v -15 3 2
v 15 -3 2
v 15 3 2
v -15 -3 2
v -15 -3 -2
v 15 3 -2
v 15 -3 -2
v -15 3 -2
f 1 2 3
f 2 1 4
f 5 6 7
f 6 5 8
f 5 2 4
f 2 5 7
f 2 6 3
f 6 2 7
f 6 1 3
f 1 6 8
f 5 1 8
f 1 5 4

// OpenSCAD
// Fixture: the `lever` mode.
//
// `lever_length` stands in for locking-mechanism-hyperobject.lever_length: it is scoped
// to this mode by `visible_in_modes` and it is USED here, so it is alive — even though
// no source of the `stand` mode mentions it. A rule that judged a parameter against
// every mode instead of the modes that list it would call this healthy parameter dead.

lever_length = 30;
render_mode = 1;
target_part = "lever";

module lever() {
    cube([lever_length, 6, 4], center = true);
}

lever();
